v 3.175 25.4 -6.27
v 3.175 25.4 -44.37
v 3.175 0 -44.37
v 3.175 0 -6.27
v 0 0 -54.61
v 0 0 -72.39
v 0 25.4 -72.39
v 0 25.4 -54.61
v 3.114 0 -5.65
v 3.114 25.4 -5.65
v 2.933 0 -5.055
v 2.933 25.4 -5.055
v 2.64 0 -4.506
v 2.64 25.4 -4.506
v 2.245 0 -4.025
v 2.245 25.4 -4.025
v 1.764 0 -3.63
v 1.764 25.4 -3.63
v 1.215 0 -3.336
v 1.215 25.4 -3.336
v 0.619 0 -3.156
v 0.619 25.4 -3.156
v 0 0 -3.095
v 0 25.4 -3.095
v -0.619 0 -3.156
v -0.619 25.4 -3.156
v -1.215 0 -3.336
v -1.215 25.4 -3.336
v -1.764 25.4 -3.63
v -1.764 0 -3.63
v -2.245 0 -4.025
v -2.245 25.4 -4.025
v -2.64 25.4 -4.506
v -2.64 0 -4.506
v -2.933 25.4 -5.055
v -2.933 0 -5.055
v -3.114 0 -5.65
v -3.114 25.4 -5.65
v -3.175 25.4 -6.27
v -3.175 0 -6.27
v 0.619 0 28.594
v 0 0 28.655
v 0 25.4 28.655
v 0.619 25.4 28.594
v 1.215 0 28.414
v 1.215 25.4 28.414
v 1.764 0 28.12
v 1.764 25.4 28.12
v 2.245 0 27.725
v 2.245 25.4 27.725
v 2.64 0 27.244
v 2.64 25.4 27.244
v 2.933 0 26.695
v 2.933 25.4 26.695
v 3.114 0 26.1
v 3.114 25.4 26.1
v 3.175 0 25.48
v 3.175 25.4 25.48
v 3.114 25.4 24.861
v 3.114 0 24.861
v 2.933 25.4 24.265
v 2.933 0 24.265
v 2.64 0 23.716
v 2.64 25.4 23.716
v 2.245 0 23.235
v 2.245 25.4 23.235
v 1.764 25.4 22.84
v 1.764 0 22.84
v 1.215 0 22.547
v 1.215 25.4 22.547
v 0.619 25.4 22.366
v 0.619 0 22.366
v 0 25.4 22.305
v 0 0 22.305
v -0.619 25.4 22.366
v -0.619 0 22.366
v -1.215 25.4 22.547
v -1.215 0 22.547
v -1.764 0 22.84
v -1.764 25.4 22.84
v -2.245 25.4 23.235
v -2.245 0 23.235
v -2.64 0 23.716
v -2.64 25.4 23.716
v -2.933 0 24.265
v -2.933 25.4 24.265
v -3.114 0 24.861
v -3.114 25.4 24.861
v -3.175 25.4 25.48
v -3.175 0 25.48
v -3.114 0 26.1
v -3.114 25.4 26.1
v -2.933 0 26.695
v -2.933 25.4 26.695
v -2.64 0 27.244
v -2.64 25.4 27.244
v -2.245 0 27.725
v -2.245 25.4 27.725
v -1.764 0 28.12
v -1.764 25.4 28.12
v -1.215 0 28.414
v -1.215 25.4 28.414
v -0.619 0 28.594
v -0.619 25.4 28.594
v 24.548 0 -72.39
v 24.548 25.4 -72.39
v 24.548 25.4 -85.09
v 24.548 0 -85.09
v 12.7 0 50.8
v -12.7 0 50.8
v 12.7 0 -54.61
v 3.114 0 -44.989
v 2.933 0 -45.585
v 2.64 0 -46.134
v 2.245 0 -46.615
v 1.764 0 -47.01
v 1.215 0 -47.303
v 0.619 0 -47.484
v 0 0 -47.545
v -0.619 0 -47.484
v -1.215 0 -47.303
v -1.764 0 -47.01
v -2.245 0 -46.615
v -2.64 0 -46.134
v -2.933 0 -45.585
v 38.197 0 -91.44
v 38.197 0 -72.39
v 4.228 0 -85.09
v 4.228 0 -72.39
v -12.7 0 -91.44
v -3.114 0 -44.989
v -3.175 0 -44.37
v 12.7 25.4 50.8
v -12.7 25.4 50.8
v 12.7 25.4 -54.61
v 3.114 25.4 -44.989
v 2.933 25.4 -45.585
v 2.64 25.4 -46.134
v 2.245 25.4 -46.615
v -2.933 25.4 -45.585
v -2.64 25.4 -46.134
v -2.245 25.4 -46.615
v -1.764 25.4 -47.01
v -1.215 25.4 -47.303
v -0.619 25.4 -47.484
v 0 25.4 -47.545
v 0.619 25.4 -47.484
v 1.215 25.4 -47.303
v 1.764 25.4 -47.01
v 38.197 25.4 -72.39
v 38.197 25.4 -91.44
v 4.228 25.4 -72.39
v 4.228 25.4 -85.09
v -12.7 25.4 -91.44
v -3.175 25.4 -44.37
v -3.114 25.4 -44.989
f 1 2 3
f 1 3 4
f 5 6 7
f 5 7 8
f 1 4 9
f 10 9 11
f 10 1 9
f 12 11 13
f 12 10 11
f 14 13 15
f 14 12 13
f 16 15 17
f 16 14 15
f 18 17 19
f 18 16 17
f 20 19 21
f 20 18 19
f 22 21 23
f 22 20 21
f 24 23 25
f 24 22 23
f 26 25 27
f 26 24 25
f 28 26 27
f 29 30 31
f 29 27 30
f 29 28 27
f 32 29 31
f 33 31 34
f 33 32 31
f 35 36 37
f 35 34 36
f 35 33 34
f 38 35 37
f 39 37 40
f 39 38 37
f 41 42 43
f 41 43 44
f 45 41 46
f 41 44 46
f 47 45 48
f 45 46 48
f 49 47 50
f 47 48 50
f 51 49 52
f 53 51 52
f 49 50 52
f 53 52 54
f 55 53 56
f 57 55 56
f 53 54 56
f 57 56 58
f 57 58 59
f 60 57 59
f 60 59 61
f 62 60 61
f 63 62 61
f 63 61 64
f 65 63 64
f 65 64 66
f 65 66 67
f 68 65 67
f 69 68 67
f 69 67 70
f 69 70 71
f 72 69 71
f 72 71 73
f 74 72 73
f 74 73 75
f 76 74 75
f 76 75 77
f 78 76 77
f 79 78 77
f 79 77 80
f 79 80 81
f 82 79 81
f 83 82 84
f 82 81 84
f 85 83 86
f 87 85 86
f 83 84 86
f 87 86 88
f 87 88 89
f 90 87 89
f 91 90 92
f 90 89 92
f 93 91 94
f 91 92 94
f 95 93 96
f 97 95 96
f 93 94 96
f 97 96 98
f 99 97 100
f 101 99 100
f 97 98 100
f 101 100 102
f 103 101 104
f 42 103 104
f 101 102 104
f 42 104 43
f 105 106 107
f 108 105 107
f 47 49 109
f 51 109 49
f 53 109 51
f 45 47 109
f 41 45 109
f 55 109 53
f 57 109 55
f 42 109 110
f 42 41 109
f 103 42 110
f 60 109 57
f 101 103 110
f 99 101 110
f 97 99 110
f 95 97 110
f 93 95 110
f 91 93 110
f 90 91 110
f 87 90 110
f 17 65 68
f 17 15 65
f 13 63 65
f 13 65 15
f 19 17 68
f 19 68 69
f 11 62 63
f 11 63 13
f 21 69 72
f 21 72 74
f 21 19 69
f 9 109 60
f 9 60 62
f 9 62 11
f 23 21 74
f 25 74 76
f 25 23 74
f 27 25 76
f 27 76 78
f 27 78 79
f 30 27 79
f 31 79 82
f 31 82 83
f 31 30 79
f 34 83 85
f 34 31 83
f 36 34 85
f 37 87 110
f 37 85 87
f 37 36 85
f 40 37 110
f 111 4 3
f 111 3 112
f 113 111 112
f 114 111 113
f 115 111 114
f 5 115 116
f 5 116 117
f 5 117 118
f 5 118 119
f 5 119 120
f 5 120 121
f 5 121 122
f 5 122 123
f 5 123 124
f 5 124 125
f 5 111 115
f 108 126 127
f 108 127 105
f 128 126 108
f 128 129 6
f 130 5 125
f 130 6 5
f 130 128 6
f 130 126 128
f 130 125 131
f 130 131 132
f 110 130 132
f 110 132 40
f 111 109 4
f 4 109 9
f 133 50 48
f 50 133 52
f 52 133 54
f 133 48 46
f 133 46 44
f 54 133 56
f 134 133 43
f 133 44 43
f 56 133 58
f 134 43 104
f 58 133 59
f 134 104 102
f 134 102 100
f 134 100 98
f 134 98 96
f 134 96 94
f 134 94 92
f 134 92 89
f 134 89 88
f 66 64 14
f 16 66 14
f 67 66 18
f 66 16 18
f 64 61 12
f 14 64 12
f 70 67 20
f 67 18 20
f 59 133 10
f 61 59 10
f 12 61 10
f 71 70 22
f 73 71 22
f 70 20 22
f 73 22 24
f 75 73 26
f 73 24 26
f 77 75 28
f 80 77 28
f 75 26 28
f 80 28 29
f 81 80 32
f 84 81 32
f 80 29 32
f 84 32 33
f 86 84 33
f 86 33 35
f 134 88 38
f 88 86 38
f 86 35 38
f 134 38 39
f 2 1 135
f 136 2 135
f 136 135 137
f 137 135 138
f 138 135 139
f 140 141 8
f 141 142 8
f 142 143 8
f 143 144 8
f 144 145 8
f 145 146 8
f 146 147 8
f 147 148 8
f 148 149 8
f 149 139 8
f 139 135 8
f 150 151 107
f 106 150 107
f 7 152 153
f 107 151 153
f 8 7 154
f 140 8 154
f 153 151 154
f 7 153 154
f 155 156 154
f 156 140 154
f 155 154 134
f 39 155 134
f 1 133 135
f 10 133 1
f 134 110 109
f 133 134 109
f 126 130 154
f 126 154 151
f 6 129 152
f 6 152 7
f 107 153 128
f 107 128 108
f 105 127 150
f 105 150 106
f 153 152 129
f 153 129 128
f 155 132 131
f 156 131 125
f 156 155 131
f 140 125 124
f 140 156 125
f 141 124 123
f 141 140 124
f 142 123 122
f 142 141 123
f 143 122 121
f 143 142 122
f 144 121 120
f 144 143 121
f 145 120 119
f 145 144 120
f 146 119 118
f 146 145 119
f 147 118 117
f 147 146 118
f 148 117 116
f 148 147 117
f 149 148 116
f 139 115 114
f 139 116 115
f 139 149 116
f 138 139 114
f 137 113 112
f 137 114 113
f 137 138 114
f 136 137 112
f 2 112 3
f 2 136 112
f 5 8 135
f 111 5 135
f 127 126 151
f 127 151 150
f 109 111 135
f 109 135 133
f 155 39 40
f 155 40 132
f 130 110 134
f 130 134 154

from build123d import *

# Parameters (mm, degrees)
SKETCH1_W           = 25.4
SKETCH1_H           = 101.6
BOSS_EXTRUDE1_DEPTH = 25.4
SKETCH2_R           = 3.175
CUT_EXTRUDE1_DEPTH  = 59.198711326
BOSS_EXTRUDE2_DEPTH = 25.4
SKETCH4_W           = 20.32
SKETCH4_H           = 12.7
CUT_EXTRUDE2_DEPTH  = 152.4


with BuildPart() as part:
    # Sketch1 → Boss-Extrude1 (new body)
    with BuildSketch(Plane(origin=(0, 0, 0), x_dir=(1, 0, 0), z_dir=(0, 1, 0))):
        Rectangle(SKETCH1_W, SKETCH1_H)
    extrude(amount=BOSS_EXTRUDE1_DEPTH)

    # Sketch2 → Cut-Extrude1 (cut, through all)
    with BuildSketch(Plane(origin=(0, 25.4, 0), x_dir=(1, 0, 0), z_dir=(0, 1, 0))):
        with Locations(Location((0, -25.480397296, 0), (0, 0, 270))):
            Circle(SKETCH2_R)
        with BuildLine():
            Line((3.175, 44.369602704), (3.175, 6.269602704))
            ThreePointArc((3.175, 6.269602704), (0, 3.094602704), (-3.175, 6.269602704))
            Line((-3.175, 6.269602704), (-3.175, 44.369602704))
            ThreePointArc((-3.175, 44.369602704), (0, 47.544602704), (3.175, 44.369602704))
        make_face()
    extrude(amount=-CUT_EXTRUDE1_DEPTH, mode=Mode.SUBTRACT)

    # Sketch3 → Boss-Extrude2 (add)
    with BuildSketch(Plane(origin=(0, 0, 0), x_dir=(1, 0, 0), z_dir=(0, 1, 0))):
        Polygon((-12.7, 50.8), (-12.7, 91.44), (38.196727149, 91.44), (38.196727149, 72.39), (0, 72.39), (0, 54.61), (12.7, 54.61), (12.7, 50.8), align=None)
    extrude(amount=BOSS_EXTRUDE2_DEPTH)

    # Sketch4 → Cut-Extrude2 (cut)
    with BuildSketch(Plane(origin=(0, 25.4, 0), x_dir=(1, 0, 0), z_dir=(0, 1, 0))):
        with Locations((14.387739516, 78.74)):
            Rectangle(SKETCH4_W, SKETCH4_H)
    extrude(amount=-CUT_EXTRUDE2_DEPTH, mode=Mode.SUBTRACT)


solid = part.part
